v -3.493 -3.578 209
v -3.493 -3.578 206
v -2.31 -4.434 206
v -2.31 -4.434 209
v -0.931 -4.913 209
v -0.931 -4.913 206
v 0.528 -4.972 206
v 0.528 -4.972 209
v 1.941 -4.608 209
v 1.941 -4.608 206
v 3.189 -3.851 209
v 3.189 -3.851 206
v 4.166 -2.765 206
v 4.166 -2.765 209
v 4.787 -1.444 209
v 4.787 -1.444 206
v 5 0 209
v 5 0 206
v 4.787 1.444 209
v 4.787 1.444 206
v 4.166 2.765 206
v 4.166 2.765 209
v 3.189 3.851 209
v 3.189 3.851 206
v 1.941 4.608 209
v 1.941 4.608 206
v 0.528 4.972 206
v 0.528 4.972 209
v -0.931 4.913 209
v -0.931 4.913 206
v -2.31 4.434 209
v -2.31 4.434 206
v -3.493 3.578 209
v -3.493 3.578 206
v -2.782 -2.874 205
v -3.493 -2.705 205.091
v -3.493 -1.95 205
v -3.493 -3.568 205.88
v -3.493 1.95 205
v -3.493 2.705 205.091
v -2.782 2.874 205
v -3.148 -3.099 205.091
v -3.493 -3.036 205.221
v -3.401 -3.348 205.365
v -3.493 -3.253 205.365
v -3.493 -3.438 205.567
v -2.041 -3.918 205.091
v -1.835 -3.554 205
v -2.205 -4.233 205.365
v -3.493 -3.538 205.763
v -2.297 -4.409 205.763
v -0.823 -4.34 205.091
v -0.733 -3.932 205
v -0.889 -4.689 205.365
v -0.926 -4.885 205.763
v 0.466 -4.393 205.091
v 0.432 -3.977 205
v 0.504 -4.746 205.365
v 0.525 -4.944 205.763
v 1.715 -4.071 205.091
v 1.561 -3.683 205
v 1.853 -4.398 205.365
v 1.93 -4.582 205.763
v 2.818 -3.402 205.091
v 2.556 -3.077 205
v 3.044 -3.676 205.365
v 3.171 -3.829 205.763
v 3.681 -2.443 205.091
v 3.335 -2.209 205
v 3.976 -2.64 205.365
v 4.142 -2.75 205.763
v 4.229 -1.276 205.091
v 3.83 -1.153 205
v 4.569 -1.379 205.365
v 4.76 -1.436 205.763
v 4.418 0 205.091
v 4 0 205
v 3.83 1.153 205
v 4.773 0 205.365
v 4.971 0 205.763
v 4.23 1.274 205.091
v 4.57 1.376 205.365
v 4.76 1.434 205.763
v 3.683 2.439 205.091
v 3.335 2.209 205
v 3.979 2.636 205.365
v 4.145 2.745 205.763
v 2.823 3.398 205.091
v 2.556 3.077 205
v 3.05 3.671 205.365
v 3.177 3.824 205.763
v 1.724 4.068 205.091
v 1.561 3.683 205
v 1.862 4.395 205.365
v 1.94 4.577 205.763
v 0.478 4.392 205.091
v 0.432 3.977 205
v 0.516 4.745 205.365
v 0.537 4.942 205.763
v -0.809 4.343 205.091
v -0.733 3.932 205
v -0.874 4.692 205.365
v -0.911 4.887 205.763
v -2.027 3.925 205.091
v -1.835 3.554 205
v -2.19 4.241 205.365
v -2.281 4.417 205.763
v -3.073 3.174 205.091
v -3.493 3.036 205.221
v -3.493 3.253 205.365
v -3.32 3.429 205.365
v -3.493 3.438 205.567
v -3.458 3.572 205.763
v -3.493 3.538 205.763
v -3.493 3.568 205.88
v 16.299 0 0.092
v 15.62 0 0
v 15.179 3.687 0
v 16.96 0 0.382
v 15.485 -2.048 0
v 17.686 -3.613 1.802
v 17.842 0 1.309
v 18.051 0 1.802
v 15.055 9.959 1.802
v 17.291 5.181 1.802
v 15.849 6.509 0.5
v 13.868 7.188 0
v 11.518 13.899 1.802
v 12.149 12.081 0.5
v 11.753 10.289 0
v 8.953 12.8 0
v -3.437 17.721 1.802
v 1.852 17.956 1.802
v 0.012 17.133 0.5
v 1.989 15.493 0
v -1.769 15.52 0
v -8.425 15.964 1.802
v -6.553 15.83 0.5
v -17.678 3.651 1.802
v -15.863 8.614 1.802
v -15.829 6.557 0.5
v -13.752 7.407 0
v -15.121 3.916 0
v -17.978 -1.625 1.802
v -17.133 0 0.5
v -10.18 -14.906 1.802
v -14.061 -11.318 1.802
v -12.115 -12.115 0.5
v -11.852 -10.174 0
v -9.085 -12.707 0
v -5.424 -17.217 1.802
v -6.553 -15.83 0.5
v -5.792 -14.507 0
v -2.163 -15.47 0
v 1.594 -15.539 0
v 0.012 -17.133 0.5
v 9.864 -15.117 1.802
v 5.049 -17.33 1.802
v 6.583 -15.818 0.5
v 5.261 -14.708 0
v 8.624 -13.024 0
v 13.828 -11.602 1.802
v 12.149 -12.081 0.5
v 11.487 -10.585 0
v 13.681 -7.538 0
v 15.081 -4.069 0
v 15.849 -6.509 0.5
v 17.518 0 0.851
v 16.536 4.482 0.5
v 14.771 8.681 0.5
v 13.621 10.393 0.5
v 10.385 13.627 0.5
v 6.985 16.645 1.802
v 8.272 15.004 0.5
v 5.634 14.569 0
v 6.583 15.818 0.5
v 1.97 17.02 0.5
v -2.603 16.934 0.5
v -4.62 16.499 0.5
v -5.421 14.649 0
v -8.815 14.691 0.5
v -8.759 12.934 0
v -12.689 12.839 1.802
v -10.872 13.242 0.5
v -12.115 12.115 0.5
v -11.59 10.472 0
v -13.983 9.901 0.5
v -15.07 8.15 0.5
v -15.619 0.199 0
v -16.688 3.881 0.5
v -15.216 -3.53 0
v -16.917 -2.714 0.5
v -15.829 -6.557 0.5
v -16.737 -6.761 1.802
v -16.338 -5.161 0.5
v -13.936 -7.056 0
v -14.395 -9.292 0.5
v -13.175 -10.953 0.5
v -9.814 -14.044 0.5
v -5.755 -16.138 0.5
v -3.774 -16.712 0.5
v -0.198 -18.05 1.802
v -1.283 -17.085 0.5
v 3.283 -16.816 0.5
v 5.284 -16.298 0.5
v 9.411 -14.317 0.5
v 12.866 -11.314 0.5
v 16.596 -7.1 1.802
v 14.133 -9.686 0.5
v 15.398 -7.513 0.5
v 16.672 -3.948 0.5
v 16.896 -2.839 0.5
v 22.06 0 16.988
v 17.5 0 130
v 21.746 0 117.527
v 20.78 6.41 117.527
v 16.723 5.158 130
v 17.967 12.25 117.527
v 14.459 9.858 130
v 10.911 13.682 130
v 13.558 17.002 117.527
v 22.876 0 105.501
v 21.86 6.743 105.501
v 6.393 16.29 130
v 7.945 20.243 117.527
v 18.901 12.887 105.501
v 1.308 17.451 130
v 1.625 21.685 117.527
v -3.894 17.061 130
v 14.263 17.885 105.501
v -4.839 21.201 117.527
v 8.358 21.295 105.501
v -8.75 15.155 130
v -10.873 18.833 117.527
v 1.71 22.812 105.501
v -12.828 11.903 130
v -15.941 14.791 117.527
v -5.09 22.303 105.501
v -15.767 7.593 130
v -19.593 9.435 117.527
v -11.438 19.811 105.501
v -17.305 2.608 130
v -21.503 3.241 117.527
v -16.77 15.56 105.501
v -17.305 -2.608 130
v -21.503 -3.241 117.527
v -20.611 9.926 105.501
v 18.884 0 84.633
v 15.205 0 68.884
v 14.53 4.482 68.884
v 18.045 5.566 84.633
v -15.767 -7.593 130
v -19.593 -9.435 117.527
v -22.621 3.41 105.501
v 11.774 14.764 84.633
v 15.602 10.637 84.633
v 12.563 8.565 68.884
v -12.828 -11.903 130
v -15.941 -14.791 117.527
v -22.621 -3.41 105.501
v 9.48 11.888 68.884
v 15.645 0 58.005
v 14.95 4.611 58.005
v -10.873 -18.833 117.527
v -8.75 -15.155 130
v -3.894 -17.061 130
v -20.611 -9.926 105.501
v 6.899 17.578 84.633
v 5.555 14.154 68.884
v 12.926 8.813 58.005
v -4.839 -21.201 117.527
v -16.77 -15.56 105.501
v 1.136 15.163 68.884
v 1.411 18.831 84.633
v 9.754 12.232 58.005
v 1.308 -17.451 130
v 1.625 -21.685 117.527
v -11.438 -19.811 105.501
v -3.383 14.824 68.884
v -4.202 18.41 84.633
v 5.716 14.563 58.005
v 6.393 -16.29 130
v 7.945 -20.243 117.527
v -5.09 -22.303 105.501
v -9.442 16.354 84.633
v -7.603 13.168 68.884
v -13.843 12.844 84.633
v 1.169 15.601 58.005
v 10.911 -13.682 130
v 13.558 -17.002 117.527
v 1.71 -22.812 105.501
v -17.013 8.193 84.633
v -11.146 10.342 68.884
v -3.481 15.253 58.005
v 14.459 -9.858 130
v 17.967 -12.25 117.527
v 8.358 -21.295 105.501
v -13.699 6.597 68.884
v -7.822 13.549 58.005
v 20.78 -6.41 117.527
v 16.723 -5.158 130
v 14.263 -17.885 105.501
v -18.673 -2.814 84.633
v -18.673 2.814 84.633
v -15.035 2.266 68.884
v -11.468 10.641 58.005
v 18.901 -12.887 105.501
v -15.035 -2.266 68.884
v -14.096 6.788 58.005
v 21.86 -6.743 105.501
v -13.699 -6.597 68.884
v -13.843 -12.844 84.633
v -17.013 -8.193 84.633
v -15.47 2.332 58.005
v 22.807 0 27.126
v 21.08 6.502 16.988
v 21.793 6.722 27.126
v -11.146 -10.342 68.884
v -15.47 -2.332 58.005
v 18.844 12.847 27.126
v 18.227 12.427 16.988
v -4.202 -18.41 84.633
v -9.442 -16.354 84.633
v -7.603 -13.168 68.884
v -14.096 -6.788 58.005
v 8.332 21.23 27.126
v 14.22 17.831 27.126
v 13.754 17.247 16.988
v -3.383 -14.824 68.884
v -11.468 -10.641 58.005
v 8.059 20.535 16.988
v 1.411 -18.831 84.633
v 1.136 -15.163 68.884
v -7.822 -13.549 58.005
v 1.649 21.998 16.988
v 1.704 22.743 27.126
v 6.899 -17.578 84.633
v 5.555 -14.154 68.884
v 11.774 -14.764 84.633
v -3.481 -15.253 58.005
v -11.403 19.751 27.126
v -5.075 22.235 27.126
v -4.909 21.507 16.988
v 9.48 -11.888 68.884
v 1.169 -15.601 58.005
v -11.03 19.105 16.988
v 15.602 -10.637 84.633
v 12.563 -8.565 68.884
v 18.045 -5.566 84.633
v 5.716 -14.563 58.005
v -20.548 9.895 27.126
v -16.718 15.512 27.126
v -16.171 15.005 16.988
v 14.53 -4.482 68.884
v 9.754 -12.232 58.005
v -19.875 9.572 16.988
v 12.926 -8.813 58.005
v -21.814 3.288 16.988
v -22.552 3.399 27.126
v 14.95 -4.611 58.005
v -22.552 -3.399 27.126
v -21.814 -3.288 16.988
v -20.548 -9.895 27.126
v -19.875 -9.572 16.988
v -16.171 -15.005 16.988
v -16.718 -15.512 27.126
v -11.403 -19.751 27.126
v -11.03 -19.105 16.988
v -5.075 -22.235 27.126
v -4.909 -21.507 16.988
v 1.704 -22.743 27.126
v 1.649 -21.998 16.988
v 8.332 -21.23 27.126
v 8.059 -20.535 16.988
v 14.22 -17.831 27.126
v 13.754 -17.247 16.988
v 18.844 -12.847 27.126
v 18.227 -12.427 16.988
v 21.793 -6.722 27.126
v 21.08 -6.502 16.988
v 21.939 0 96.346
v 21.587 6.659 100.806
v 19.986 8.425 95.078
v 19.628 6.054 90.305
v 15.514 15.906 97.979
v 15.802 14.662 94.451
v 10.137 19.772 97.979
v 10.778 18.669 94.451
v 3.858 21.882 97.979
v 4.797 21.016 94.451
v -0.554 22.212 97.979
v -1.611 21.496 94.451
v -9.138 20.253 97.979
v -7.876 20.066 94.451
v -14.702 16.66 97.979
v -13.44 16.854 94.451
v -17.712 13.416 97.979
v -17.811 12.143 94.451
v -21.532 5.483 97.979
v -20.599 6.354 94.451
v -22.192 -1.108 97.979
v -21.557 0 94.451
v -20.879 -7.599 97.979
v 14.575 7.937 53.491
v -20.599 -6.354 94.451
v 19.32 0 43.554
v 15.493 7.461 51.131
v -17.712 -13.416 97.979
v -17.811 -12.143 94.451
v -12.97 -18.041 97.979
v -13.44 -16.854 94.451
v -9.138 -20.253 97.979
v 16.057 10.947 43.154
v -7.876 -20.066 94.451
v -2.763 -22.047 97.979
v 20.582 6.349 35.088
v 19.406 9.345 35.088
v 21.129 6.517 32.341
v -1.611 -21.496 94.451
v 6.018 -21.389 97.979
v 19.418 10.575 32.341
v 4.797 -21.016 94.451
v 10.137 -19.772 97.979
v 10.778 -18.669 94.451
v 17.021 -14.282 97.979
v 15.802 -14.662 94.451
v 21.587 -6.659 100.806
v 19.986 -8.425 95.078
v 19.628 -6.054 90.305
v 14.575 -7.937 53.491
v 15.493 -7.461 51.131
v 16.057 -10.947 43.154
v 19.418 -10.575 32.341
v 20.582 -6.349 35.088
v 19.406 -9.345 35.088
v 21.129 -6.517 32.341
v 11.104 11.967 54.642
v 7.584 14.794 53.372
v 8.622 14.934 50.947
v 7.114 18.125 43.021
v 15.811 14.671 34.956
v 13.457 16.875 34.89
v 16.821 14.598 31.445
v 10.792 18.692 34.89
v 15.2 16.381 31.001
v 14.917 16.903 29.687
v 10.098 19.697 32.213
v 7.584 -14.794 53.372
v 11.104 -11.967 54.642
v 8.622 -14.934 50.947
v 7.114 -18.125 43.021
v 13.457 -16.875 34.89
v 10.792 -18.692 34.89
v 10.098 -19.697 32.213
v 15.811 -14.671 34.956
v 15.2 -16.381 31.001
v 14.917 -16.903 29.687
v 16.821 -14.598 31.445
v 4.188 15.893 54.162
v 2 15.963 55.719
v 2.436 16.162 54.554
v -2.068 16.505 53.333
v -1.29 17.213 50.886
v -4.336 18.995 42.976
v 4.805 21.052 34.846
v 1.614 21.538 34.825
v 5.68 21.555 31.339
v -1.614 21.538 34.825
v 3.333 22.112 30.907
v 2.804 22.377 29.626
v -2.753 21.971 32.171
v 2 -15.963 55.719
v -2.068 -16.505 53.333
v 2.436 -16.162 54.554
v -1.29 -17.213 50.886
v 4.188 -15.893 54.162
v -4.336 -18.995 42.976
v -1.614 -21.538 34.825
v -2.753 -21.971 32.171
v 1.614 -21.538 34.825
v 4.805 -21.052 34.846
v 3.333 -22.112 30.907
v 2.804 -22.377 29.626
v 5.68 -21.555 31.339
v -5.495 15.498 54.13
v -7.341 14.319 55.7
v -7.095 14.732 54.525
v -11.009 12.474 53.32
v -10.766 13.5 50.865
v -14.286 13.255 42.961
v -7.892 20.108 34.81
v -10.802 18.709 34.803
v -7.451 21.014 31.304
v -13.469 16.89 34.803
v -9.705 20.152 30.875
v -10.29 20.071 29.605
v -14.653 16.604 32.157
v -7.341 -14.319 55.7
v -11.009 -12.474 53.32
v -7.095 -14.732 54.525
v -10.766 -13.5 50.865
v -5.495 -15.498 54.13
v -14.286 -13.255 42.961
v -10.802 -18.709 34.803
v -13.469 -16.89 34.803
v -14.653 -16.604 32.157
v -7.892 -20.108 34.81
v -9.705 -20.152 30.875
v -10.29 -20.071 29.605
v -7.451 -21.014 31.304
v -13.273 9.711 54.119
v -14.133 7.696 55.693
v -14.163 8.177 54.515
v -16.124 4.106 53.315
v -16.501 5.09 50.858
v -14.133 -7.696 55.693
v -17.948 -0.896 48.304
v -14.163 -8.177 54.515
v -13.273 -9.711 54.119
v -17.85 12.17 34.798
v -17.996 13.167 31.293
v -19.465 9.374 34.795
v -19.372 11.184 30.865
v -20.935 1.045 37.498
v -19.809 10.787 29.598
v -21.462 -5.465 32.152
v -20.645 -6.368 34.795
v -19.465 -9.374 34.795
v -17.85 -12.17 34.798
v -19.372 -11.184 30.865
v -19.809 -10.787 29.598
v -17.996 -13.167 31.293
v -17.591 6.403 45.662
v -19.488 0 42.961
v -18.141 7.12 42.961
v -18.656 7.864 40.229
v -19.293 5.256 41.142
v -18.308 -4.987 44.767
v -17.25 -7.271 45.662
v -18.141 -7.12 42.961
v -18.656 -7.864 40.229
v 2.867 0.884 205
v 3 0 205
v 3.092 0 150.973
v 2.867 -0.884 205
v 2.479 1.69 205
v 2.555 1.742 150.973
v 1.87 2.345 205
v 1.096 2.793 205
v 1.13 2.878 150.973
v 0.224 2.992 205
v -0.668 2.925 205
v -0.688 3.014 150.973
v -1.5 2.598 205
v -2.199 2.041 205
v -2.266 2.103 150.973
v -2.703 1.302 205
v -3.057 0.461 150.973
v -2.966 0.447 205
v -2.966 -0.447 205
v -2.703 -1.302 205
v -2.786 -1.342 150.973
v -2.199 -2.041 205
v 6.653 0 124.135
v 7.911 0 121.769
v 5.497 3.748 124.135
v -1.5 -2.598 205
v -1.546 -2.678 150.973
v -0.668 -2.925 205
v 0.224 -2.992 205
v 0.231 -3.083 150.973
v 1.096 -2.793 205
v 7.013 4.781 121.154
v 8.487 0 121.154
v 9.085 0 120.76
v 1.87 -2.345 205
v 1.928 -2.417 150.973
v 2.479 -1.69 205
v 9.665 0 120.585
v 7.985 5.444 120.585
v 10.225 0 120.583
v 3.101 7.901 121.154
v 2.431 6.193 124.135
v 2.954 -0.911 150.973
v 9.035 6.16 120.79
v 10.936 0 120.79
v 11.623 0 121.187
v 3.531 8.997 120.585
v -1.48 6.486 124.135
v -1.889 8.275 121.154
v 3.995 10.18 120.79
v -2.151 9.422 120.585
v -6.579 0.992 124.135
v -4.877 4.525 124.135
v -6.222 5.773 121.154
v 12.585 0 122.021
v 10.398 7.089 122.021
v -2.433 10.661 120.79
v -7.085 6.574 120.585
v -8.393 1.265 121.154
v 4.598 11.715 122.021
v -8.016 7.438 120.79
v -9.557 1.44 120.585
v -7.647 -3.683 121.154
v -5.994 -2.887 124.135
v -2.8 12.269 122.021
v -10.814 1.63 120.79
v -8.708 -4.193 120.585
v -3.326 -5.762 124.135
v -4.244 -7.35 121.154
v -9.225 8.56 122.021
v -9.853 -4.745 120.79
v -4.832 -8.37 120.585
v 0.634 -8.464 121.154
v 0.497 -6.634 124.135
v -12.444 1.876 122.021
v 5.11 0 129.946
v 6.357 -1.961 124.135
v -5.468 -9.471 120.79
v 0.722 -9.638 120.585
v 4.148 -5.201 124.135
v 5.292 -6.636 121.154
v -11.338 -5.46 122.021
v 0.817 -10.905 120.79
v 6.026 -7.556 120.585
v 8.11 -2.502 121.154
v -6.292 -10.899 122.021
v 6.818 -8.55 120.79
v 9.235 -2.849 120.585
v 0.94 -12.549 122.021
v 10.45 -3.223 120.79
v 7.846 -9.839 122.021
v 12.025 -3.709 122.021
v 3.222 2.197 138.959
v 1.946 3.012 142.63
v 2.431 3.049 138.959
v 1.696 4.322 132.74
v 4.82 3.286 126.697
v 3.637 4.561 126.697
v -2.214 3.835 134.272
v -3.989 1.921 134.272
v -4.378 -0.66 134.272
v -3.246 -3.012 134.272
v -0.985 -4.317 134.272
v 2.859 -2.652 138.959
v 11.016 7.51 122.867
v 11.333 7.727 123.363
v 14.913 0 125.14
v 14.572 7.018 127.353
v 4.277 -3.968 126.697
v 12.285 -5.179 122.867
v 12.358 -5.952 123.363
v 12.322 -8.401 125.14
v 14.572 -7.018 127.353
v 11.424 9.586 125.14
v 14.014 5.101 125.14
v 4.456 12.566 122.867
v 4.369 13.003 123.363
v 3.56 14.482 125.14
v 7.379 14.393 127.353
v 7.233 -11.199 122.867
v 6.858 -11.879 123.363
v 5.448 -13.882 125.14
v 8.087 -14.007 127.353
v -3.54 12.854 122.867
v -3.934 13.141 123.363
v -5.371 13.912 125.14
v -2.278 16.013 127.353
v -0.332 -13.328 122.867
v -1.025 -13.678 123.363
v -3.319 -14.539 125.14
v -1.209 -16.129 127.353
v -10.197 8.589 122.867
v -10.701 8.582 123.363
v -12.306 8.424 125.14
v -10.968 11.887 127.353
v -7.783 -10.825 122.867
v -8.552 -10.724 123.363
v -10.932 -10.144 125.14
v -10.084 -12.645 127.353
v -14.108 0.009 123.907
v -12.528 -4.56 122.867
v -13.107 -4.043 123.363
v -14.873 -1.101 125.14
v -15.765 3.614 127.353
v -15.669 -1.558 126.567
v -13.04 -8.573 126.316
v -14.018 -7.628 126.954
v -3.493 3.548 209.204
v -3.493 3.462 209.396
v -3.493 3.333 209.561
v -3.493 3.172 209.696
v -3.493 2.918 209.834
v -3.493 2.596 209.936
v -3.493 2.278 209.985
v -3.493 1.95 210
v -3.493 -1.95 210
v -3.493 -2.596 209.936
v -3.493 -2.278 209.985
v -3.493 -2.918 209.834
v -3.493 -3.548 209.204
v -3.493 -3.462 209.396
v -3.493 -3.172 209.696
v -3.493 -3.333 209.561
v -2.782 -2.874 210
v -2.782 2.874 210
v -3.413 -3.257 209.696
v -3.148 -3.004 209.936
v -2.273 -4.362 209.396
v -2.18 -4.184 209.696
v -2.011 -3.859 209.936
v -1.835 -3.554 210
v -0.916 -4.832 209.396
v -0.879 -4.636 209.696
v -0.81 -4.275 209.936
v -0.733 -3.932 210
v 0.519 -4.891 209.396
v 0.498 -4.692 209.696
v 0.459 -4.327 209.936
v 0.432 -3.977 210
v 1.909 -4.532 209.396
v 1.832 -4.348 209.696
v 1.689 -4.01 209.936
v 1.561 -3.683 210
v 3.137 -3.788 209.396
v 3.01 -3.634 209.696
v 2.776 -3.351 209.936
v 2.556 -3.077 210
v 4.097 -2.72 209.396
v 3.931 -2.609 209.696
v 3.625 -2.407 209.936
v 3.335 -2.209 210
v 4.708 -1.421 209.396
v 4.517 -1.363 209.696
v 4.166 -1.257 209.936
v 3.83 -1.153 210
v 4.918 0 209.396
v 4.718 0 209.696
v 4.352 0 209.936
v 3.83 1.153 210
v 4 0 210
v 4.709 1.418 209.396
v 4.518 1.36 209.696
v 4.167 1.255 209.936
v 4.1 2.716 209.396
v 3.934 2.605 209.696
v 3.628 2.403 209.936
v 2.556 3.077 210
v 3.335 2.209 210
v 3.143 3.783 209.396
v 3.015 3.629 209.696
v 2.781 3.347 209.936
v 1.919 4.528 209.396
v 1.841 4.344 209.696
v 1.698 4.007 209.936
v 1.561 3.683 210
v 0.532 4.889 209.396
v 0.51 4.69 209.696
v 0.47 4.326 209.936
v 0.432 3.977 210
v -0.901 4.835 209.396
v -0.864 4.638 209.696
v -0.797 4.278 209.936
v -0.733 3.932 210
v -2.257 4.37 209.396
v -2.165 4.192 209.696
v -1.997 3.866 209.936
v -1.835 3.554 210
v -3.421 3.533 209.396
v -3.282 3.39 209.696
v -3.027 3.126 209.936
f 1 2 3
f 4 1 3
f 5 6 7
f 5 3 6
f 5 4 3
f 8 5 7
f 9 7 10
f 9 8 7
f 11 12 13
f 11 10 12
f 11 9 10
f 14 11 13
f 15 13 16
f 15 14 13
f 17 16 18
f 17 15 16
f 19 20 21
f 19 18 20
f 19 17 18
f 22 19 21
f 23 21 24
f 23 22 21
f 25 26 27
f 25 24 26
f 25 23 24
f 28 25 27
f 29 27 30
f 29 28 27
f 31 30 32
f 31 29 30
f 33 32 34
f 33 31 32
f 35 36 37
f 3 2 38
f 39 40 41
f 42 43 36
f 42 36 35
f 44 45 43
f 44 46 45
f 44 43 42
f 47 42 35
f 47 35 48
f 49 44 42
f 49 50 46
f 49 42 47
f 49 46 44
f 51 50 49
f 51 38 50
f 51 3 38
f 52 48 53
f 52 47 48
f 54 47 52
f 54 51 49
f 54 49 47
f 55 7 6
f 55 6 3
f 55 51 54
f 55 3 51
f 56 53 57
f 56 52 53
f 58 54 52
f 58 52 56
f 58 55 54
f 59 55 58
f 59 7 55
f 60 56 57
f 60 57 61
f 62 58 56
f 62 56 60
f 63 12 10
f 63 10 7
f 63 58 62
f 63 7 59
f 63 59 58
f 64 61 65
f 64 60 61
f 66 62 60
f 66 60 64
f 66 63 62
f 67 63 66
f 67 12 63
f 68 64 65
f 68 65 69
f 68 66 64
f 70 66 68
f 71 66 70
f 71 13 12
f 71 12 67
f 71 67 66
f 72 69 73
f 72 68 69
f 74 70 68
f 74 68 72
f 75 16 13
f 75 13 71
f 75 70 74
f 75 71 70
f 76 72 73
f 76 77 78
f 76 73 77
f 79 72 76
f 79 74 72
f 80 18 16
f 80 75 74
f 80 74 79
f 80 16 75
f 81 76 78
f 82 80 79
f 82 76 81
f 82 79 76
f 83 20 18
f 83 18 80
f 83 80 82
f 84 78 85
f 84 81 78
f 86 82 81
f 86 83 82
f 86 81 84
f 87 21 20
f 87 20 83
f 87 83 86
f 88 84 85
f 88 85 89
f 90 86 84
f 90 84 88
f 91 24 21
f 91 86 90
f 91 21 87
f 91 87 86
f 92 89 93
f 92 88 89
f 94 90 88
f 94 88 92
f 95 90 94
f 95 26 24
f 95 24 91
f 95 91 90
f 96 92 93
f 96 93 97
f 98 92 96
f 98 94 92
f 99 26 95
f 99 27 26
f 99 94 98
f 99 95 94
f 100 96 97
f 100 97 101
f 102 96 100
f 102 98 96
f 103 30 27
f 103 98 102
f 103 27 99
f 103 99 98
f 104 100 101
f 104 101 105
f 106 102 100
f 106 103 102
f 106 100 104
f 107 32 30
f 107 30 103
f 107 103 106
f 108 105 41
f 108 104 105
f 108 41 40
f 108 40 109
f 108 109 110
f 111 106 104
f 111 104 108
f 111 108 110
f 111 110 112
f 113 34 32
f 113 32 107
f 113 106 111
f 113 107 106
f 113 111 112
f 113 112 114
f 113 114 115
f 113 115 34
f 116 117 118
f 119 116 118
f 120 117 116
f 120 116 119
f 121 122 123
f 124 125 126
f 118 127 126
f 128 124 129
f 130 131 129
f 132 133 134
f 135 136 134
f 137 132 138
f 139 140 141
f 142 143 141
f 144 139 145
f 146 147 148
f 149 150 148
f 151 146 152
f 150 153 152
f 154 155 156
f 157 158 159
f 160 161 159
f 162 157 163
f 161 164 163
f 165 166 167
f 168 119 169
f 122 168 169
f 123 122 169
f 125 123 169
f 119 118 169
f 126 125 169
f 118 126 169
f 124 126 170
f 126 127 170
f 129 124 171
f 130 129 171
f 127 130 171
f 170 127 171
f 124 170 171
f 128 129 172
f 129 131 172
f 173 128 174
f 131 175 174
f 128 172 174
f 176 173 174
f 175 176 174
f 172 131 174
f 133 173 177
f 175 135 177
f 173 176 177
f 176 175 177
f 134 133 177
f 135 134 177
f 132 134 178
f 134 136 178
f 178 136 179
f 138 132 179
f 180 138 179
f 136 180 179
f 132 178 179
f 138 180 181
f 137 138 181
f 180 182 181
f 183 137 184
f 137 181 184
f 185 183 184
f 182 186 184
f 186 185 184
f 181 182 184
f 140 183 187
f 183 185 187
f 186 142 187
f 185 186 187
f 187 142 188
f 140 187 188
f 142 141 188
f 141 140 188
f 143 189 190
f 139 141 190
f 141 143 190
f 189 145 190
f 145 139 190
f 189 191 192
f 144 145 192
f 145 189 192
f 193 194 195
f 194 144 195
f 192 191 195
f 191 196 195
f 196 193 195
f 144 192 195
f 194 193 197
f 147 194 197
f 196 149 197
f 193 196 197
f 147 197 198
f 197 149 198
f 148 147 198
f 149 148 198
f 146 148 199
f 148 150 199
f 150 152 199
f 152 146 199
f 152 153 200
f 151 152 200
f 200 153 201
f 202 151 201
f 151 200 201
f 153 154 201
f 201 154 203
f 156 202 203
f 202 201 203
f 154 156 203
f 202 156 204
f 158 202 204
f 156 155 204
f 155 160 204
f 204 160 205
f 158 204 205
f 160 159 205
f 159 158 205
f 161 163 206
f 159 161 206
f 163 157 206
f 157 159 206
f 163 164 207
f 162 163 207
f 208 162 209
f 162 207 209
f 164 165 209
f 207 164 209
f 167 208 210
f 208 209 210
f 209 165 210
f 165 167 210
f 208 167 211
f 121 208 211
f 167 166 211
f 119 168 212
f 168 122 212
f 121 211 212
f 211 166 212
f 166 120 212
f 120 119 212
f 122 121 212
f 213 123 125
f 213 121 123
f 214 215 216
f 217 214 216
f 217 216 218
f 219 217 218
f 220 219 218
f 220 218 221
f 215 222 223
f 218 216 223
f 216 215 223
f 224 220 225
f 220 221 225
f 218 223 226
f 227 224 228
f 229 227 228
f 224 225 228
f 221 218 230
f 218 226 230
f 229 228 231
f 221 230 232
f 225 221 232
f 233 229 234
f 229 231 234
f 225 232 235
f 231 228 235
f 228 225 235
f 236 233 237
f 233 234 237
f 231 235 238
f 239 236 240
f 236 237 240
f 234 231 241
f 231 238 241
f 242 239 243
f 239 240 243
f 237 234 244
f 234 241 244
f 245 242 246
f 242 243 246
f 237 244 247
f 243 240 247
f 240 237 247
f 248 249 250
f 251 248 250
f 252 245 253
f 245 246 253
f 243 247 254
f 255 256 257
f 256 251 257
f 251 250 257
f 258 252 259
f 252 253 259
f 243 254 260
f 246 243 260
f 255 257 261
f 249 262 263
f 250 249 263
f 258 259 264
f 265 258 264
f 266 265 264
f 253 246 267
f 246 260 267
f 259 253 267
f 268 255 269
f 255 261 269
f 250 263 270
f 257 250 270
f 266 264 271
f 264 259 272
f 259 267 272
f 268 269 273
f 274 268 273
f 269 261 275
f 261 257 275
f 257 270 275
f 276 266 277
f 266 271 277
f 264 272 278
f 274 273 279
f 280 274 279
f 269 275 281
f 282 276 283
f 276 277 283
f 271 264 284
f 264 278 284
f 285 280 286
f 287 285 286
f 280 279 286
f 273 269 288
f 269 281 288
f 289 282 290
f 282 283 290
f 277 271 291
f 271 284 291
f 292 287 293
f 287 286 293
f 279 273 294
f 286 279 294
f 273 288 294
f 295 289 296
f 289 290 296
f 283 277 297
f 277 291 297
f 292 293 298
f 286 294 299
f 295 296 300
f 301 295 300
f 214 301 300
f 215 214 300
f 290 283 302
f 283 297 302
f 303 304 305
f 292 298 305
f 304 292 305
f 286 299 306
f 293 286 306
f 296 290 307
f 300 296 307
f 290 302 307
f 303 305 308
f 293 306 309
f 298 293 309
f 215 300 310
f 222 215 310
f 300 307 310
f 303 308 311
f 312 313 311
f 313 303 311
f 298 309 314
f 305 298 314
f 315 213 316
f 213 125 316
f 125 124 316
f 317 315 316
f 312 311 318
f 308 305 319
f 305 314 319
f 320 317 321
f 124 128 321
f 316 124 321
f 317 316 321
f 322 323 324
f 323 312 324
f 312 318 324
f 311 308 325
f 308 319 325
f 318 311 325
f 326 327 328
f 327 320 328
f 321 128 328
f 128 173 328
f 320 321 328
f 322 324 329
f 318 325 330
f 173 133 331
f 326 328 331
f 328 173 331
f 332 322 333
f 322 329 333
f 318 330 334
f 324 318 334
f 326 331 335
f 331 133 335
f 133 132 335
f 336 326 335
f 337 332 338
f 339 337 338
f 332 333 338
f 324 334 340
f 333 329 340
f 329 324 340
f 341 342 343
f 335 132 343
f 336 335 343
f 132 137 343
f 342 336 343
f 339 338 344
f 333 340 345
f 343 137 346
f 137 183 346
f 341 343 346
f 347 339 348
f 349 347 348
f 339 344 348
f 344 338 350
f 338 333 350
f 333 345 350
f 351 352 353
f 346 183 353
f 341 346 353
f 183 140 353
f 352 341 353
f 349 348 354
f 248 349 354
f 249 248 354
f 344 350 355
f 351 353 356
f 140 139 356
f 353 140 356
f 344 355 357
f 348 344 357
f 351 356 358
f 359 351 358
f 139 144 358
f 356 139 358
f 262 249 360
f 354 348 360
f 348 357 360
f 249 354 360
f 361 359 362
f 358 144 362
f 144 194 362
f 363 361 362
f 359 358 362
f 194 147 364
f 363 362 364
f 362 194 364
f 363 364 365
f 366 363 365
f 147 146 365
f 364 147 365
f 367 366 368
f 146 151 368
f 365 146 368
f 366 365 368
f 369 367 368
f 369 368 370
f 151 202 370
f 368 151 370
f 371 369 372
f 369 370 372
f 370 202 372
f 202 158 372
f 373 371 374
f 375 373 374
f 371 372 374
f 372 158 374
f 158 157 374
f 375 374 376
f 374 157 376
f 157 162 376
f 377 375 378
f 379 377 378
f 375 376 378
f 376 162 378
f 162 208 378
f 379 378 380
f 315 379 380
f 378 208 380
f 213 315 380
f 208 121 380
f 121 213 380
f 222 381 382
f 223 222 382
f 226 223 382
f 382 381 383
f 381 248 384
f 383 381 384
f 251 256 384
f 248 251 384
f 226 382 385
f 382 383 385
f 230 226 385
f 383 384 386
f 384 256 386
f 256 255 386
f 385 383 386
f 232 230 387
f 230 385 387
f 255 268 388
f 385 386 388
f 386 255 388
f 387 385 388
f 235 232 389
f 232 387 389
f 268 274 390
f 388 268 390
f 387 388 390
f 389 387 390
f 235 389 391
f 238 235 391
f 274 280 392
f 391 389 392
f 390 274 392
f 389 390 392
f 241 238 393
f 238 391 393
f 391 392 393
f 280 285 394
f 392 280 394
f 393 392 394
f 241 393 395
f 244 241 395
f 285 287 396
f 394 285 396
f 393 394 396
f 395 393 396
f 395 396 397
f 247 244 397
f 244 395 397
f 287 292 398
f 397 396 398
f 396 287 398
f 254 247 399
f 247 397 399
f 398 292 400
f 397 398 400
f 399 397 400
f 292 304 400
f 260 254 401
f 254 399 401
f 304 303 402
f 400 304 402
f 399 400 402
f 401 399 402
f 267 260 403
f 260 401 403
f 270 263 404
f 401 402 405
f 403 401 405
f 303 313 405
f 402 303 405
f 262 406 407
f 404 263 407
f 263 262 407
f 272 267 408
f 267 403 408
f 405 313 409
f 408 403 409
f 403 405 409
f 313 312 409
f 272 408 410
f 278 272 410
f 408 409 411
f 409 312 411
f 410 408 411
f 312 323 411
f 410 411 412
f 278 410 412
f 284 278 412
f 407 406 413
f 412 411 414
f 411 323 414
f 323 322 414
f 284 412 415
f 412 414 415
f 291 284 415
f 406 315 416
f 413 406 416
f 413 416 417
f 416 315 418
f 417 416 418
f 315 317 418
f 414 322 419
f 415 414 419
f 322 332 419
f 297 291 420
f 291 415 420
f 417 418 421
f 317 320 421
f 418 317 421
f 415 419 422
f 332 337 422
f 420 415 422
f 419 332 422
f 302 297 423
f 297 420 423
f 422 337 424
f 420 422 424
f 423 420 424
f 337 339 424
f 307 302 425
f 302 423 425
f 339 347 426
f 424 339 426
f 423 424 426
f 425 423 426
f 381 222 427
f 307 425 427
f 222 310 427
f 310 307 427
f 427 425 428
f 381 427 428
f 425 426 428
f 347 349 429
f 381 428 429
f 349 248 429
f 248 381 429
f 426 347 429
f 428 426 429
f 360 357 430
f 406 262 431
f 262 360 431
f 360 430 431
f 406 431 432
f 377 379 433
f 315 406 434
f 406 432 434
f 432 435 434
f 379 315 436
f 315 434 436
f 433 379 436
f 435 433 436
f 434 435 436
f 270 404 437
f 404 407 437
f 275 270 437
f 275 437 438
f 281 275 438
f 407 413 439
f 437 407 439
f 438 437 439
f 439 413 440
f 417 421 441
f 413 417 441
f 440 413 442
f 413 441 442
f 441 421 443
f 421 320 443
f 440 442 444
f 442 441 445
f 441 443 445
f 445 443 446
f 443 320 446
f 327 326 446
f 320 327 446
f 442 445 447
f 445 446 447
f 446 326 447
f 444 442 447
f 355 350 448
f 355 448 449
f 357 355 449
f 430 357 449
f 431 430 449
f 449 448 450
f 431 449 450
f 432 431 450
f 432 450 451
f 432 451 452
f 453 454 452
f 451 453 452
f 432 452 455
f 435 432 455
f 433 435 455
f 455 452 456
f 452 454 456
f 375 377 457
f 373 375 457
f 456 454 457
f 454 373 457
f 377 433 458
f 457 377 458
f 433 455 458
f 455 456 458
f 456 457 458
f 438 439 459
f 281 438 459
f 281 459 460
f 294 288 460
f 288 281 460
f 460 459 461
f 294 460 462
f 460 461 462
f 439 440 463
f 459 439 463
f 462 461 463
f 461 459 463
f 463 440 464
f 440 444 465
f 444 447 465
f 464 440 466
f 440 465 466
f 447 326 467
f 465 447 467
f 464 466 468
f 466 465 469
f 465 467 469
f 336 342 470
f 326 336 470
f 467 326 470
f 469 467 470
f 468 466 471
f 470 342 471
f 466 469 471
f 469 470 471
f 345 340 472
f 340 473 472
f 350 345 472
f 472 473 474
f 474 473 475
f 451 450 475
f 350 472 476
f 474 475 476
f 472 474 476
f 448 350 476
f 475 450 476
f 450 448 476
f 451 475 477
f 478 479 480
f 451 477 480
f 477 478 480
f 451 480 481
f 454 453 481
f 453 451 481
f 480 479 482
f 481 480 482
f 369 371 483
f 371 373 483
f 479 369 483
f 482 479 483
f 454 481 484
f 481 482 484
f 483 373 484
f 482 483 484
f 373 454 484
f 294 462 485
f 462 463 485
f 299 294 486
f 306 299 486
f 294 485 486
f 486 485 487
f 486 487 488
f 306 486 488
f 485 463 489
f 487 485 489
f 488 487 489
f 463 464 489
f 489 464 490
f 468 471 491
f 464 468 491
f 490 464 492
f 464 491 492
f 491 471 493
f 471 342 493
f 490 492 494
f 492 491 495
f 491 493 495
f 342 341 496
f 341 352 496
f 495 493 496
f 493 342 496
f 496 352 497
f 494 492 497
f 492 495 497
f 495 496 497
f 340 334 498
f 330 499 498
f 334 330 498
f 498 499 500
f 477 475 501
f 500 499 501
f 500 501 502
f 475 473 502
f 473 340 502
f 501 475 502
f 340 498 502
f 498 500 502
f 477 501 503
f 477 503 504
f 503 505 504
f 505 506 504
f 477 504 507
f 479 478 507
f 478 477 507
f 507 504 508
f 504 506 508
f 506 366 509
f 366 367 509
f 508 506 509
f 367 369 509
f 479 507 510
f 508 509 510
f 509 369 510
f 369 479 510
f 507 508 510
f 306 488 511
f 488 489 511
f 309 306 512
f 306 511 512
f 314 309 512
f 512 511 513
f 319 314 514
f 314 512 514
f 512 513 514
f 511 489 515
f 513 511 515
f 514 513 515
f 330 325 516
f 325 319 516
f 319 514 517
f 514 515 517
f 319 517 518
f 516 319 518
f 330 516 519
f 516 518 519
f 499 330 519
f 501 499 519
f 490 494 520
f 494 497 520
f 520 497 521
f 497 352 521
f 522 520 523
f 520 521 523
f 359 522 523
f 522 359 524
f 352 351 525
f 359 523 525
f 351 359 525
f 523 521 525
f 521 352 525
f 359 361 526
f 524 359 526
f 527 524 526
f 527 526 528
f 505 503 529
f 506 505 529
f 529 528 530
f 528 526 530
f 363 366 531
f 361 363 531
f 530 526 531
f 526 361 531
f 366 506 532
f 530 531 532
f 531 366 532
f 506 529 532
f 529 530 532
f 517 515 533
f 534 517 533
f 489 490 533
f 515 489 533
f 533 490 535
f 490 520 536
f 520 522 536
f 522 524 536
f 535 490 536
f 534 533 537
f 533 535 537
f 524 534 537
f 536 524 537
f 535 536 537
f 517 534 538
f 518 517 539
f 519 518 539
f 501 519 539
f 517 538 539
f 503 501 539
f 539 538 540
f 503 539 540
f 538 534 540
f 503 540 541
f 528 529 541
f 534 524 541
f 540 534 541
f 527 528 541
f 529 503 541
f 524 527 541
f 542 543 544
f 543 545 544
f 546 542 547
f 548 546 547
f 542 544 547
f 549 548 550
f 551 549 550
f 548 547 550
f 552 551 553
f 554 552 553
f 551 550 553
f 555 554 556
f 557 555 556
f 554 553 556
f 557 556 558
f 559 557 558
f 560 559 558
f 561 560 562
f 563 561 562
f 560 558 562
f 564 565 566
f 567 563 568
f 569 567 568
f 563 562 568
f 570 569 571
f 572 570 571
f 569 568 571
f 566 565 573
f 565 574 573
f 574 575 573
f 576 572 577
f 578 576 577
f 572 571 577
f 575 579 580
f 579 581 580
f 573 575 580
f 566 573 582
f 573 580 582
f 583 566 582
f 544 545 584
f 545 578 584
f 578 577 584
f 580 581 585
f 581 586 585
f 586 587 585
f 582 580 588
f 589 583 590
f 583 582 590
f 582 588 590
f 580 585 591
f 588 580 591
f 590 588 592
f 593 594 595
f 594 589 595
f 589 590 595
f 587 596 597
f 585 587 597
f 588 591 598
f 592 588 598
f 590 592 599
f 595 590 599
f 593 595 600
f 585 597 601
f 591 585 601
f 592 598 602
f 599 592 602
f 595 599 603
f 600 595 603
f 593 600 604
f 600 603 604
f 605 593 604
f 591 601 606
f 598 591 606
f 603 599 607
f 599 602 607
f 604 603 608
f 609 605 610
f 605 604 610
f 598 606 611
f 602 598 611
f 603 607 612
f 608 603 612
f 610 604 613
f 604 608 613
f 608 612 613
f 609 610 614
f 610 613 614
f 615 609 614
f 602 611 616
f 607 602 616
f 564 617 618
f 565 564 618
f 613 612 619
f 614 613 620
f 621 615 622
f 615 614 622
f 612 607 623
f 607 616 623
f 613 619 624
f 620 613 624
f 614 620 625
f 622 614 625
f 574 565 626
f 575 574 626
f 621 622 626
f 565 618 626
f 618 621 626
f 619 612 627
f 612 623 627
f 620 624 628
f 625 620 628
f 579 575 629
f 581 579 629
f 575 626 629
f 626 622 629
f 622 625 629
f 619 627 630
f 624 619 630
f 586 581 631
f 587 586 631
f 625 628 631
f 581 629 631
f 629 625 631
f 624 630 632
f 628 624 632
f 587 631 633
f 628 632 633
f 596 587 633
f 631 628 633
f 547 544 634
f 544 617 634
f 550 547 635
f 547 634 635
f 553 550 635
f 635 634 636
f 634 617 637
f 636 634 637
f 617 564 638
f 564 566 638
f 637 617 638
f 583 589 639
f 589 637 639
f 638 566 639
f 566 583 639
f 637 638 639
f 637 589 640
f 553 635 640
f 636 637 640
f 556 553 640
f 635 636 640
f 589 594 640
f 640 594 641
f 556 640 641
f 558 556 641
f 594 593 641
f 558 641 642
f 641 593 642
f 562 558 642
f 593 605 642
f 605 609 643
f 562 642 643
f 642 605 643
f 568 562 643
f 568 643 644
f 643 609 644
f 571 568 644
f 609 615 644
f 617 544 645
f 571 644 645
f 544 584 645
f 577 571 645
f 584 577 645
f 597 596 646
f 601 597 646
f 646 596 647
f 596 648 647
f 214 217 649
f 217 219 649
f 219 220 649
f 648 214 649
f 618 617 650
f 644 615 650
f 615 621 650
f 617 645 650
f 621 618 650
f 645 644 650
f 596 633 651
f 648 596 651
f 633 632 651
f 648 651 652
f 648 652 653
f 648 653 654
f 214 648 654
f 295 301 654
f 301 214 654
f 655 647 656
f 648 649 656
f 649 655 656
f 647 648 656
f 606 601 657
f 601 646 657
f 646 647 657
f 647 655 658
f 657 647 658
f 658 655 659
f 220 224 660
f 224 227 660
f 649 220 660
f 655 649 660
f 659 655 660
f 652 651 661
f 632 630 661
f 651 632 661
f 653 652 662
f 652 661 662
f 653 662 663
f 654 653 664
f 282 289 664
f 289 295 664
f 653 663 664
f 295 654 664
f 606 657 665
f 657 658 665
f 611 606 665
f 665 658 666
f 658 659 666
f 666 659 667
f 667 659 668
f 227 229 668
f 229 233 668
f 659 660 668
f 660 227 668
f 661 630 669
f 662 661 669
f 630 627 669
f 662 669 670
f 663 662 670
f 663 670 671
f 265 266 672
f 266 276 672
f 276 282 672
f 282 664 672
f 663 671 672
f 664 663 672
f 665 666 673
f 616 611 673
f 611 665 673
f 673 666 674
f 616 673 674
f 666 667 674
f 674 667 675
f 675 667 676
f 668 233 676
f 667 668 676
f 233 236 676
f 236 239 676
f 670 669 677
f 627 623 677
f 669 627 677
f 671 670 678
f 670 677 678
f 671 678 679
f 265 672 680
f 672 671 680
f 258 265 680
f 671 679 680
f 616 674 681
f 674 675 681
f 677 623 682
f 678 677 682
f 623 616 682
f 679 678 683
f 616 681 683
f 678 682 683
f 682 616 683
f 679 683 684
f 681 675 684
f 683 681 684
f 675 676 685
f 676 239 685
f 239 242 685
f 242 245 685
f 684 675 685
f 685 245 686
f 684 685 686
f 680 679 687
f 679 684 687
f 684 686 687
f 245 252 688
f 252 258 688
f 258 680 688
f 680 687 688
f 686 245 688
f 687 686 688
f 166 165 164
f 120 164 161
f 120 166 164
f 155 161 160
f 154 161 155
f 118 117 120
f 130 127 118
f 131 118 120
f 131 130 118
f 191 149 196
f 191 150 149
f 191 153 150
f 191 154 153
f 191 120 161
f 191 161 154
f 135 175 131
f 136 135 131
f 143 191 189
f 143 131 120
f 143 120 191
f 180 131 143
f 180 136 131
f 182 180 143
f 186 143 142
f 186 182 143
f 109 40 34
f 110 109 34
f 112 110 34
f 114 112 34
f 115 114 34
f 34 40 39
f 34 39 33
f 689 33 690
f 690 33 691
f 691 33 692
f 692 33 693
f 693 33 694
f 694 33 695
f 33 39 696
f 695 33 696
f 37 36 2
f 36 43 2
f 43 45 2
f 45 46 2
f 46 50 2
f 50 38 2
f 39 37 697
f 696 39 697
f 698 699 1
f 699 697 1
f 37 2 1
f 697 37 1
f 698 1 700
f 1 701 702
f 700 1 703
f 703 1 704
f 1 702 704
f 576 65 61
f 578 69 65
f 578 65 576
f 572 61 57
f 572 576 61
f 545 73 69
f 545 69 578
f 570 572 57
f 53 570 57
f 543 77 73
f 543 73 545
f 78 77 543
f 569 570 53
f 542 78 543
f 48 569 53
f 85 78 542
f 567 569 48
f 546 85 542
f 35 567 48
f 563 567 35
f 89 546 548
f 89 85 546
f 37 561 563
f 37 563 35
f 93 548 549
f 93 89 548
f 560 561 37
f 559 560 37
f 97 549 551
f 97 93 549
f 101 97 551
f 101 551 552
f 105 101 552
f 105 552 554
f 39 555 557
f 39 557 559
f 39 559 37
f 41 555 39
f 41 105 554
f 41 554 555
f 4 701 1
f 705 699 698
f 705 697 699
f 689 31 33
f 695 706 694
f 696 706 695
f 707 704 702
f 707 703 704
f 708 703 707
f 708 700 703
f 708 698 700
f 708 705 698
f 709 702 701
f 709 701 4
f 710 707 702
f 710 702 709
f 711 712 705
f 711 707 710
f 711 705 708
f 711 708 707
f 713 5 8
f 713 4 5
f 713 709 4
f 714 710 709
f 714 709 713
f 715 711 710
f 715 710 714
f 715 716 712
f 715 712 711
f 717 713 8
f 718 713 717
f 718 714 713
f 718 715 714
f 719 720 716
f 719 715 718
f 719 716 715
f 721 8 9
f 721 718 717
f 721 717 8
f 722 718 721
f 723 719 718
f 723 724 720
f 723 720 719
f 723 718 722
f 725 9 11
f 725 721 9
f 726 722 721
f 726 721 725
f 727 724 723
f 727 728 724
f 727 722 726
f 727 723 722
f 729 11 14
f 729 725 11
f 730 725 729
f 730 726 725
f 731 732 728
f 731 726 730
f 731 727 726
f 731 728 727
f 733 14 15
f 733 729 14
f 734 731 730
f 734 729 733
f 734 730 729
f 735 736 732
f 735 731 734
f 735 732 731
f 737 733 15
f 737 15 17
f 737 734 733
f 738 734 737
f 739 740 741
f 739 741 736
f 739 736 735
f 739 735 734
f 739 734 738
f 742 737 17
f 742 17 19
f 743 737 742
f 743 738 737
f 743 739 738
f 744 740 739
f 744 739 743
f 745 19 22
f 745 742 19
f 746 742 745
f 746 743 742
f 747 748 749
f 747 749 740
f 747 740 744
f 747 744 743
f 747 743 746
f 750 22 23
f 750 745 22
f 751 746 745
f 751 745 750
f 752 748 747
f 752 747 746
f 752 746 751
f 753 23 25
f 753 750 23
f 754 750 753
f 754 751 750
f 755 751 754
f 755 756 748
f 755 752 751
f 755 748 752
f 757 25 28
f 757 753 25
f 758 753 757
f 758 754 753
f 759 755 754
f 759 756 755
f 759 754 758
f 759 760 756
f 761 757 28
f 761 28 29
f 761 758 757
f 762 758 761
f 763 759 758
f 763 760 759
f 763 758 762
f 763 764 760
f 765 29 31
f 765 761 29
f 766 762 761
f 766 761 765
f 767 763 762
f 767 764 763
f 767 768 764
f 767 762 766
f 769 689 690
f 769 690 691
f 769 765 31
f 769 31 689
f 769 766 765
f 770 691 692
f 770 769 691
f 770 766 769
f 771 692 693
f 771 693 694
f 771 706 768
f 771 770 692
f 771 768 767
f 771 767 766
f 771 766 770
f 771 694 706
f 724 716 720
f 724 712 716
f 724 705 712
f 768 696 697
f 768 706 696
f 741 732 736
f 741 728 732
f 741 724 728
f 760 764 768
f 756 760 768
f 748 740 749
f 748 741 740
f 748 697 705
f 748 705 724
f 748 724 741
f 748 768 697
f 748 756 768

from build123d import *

# Parameters (mm, degrees)
F2_R     = 2.54
F3_R     = 1
F4_W     = 19.7092390154
F4_H     = 15.7092064619
F5_DEPTH = 22.4


with BuildPart() as f1:
    # F0 (on Front) → F1 (revolve)
    with BuildSketch(Plane.XZ):
        with BuildLine():
            Line((0, 130), (0, 0))
            Line((0, 0), (17.5, 0))
            add(Edge.make_bspline(
                [(17.5, 130), (22.5, 119.6596379665), (24.4853151406, 100.3614181833), (17.1932288242, 80.5399245506), (13.9866485718, 64.883493419), (17.1932288242, 49.9643932696), (24.4853151406, 27.3672993347), (22.5, 16.2580761236), (17.5, 0)],
                knots=[0, 0, 0, 0, 0.1975961429, 0.3602784274, 0.5, 0.6397215726, 0.8024038571, 1, 1, 1, 1], degree=3))
            add(Edge.make_bspline(
                [(3, 205), (1.2158900885, 130), (5.5774394423, 104.8566326499), (17.5, 130)],
                knots=[0, 0, 0, 0, 76.3888080808, 76.3888080808, 76.3888080808, 76.3888080808], degree=3))
            Line((3, 205), (0, 205))
            Line((0, 205), (0, 130))
        make_face()
        Polygon((0, 210), (0, 205), (3, 205), (5, 205), (5, 210), align=None)
    revolve(axis=Axis((0, 0, 65), (0, 0, 1)))

    # F2
    f2_edges = [f1.edges().sort_by_distance(p)[0] for p in [
        (-17.5, 0, 0),
    ]]
    fillet(f2_edges, radius=F2_R)

    # F3
    f3_edges = [f1.edges().sort_by_distance(p)[0] for p in [
        (-5, 0, 205),
        (-5, 0, 210),
    ]]
    fillet(f3_edges, radius=F3_R)

    # F4 (on Front) → F5 (cut, symmetric)
    with BuildSketch(Plane.XZ):
        with Locations((-13.3473322494, 209.7727283835)):
            Rectangle(F4_W, F4_H)
    extrude(amount=F5_DEPTH, both=True, mode=Mode.SUBTRACT)


solid = f1.part
